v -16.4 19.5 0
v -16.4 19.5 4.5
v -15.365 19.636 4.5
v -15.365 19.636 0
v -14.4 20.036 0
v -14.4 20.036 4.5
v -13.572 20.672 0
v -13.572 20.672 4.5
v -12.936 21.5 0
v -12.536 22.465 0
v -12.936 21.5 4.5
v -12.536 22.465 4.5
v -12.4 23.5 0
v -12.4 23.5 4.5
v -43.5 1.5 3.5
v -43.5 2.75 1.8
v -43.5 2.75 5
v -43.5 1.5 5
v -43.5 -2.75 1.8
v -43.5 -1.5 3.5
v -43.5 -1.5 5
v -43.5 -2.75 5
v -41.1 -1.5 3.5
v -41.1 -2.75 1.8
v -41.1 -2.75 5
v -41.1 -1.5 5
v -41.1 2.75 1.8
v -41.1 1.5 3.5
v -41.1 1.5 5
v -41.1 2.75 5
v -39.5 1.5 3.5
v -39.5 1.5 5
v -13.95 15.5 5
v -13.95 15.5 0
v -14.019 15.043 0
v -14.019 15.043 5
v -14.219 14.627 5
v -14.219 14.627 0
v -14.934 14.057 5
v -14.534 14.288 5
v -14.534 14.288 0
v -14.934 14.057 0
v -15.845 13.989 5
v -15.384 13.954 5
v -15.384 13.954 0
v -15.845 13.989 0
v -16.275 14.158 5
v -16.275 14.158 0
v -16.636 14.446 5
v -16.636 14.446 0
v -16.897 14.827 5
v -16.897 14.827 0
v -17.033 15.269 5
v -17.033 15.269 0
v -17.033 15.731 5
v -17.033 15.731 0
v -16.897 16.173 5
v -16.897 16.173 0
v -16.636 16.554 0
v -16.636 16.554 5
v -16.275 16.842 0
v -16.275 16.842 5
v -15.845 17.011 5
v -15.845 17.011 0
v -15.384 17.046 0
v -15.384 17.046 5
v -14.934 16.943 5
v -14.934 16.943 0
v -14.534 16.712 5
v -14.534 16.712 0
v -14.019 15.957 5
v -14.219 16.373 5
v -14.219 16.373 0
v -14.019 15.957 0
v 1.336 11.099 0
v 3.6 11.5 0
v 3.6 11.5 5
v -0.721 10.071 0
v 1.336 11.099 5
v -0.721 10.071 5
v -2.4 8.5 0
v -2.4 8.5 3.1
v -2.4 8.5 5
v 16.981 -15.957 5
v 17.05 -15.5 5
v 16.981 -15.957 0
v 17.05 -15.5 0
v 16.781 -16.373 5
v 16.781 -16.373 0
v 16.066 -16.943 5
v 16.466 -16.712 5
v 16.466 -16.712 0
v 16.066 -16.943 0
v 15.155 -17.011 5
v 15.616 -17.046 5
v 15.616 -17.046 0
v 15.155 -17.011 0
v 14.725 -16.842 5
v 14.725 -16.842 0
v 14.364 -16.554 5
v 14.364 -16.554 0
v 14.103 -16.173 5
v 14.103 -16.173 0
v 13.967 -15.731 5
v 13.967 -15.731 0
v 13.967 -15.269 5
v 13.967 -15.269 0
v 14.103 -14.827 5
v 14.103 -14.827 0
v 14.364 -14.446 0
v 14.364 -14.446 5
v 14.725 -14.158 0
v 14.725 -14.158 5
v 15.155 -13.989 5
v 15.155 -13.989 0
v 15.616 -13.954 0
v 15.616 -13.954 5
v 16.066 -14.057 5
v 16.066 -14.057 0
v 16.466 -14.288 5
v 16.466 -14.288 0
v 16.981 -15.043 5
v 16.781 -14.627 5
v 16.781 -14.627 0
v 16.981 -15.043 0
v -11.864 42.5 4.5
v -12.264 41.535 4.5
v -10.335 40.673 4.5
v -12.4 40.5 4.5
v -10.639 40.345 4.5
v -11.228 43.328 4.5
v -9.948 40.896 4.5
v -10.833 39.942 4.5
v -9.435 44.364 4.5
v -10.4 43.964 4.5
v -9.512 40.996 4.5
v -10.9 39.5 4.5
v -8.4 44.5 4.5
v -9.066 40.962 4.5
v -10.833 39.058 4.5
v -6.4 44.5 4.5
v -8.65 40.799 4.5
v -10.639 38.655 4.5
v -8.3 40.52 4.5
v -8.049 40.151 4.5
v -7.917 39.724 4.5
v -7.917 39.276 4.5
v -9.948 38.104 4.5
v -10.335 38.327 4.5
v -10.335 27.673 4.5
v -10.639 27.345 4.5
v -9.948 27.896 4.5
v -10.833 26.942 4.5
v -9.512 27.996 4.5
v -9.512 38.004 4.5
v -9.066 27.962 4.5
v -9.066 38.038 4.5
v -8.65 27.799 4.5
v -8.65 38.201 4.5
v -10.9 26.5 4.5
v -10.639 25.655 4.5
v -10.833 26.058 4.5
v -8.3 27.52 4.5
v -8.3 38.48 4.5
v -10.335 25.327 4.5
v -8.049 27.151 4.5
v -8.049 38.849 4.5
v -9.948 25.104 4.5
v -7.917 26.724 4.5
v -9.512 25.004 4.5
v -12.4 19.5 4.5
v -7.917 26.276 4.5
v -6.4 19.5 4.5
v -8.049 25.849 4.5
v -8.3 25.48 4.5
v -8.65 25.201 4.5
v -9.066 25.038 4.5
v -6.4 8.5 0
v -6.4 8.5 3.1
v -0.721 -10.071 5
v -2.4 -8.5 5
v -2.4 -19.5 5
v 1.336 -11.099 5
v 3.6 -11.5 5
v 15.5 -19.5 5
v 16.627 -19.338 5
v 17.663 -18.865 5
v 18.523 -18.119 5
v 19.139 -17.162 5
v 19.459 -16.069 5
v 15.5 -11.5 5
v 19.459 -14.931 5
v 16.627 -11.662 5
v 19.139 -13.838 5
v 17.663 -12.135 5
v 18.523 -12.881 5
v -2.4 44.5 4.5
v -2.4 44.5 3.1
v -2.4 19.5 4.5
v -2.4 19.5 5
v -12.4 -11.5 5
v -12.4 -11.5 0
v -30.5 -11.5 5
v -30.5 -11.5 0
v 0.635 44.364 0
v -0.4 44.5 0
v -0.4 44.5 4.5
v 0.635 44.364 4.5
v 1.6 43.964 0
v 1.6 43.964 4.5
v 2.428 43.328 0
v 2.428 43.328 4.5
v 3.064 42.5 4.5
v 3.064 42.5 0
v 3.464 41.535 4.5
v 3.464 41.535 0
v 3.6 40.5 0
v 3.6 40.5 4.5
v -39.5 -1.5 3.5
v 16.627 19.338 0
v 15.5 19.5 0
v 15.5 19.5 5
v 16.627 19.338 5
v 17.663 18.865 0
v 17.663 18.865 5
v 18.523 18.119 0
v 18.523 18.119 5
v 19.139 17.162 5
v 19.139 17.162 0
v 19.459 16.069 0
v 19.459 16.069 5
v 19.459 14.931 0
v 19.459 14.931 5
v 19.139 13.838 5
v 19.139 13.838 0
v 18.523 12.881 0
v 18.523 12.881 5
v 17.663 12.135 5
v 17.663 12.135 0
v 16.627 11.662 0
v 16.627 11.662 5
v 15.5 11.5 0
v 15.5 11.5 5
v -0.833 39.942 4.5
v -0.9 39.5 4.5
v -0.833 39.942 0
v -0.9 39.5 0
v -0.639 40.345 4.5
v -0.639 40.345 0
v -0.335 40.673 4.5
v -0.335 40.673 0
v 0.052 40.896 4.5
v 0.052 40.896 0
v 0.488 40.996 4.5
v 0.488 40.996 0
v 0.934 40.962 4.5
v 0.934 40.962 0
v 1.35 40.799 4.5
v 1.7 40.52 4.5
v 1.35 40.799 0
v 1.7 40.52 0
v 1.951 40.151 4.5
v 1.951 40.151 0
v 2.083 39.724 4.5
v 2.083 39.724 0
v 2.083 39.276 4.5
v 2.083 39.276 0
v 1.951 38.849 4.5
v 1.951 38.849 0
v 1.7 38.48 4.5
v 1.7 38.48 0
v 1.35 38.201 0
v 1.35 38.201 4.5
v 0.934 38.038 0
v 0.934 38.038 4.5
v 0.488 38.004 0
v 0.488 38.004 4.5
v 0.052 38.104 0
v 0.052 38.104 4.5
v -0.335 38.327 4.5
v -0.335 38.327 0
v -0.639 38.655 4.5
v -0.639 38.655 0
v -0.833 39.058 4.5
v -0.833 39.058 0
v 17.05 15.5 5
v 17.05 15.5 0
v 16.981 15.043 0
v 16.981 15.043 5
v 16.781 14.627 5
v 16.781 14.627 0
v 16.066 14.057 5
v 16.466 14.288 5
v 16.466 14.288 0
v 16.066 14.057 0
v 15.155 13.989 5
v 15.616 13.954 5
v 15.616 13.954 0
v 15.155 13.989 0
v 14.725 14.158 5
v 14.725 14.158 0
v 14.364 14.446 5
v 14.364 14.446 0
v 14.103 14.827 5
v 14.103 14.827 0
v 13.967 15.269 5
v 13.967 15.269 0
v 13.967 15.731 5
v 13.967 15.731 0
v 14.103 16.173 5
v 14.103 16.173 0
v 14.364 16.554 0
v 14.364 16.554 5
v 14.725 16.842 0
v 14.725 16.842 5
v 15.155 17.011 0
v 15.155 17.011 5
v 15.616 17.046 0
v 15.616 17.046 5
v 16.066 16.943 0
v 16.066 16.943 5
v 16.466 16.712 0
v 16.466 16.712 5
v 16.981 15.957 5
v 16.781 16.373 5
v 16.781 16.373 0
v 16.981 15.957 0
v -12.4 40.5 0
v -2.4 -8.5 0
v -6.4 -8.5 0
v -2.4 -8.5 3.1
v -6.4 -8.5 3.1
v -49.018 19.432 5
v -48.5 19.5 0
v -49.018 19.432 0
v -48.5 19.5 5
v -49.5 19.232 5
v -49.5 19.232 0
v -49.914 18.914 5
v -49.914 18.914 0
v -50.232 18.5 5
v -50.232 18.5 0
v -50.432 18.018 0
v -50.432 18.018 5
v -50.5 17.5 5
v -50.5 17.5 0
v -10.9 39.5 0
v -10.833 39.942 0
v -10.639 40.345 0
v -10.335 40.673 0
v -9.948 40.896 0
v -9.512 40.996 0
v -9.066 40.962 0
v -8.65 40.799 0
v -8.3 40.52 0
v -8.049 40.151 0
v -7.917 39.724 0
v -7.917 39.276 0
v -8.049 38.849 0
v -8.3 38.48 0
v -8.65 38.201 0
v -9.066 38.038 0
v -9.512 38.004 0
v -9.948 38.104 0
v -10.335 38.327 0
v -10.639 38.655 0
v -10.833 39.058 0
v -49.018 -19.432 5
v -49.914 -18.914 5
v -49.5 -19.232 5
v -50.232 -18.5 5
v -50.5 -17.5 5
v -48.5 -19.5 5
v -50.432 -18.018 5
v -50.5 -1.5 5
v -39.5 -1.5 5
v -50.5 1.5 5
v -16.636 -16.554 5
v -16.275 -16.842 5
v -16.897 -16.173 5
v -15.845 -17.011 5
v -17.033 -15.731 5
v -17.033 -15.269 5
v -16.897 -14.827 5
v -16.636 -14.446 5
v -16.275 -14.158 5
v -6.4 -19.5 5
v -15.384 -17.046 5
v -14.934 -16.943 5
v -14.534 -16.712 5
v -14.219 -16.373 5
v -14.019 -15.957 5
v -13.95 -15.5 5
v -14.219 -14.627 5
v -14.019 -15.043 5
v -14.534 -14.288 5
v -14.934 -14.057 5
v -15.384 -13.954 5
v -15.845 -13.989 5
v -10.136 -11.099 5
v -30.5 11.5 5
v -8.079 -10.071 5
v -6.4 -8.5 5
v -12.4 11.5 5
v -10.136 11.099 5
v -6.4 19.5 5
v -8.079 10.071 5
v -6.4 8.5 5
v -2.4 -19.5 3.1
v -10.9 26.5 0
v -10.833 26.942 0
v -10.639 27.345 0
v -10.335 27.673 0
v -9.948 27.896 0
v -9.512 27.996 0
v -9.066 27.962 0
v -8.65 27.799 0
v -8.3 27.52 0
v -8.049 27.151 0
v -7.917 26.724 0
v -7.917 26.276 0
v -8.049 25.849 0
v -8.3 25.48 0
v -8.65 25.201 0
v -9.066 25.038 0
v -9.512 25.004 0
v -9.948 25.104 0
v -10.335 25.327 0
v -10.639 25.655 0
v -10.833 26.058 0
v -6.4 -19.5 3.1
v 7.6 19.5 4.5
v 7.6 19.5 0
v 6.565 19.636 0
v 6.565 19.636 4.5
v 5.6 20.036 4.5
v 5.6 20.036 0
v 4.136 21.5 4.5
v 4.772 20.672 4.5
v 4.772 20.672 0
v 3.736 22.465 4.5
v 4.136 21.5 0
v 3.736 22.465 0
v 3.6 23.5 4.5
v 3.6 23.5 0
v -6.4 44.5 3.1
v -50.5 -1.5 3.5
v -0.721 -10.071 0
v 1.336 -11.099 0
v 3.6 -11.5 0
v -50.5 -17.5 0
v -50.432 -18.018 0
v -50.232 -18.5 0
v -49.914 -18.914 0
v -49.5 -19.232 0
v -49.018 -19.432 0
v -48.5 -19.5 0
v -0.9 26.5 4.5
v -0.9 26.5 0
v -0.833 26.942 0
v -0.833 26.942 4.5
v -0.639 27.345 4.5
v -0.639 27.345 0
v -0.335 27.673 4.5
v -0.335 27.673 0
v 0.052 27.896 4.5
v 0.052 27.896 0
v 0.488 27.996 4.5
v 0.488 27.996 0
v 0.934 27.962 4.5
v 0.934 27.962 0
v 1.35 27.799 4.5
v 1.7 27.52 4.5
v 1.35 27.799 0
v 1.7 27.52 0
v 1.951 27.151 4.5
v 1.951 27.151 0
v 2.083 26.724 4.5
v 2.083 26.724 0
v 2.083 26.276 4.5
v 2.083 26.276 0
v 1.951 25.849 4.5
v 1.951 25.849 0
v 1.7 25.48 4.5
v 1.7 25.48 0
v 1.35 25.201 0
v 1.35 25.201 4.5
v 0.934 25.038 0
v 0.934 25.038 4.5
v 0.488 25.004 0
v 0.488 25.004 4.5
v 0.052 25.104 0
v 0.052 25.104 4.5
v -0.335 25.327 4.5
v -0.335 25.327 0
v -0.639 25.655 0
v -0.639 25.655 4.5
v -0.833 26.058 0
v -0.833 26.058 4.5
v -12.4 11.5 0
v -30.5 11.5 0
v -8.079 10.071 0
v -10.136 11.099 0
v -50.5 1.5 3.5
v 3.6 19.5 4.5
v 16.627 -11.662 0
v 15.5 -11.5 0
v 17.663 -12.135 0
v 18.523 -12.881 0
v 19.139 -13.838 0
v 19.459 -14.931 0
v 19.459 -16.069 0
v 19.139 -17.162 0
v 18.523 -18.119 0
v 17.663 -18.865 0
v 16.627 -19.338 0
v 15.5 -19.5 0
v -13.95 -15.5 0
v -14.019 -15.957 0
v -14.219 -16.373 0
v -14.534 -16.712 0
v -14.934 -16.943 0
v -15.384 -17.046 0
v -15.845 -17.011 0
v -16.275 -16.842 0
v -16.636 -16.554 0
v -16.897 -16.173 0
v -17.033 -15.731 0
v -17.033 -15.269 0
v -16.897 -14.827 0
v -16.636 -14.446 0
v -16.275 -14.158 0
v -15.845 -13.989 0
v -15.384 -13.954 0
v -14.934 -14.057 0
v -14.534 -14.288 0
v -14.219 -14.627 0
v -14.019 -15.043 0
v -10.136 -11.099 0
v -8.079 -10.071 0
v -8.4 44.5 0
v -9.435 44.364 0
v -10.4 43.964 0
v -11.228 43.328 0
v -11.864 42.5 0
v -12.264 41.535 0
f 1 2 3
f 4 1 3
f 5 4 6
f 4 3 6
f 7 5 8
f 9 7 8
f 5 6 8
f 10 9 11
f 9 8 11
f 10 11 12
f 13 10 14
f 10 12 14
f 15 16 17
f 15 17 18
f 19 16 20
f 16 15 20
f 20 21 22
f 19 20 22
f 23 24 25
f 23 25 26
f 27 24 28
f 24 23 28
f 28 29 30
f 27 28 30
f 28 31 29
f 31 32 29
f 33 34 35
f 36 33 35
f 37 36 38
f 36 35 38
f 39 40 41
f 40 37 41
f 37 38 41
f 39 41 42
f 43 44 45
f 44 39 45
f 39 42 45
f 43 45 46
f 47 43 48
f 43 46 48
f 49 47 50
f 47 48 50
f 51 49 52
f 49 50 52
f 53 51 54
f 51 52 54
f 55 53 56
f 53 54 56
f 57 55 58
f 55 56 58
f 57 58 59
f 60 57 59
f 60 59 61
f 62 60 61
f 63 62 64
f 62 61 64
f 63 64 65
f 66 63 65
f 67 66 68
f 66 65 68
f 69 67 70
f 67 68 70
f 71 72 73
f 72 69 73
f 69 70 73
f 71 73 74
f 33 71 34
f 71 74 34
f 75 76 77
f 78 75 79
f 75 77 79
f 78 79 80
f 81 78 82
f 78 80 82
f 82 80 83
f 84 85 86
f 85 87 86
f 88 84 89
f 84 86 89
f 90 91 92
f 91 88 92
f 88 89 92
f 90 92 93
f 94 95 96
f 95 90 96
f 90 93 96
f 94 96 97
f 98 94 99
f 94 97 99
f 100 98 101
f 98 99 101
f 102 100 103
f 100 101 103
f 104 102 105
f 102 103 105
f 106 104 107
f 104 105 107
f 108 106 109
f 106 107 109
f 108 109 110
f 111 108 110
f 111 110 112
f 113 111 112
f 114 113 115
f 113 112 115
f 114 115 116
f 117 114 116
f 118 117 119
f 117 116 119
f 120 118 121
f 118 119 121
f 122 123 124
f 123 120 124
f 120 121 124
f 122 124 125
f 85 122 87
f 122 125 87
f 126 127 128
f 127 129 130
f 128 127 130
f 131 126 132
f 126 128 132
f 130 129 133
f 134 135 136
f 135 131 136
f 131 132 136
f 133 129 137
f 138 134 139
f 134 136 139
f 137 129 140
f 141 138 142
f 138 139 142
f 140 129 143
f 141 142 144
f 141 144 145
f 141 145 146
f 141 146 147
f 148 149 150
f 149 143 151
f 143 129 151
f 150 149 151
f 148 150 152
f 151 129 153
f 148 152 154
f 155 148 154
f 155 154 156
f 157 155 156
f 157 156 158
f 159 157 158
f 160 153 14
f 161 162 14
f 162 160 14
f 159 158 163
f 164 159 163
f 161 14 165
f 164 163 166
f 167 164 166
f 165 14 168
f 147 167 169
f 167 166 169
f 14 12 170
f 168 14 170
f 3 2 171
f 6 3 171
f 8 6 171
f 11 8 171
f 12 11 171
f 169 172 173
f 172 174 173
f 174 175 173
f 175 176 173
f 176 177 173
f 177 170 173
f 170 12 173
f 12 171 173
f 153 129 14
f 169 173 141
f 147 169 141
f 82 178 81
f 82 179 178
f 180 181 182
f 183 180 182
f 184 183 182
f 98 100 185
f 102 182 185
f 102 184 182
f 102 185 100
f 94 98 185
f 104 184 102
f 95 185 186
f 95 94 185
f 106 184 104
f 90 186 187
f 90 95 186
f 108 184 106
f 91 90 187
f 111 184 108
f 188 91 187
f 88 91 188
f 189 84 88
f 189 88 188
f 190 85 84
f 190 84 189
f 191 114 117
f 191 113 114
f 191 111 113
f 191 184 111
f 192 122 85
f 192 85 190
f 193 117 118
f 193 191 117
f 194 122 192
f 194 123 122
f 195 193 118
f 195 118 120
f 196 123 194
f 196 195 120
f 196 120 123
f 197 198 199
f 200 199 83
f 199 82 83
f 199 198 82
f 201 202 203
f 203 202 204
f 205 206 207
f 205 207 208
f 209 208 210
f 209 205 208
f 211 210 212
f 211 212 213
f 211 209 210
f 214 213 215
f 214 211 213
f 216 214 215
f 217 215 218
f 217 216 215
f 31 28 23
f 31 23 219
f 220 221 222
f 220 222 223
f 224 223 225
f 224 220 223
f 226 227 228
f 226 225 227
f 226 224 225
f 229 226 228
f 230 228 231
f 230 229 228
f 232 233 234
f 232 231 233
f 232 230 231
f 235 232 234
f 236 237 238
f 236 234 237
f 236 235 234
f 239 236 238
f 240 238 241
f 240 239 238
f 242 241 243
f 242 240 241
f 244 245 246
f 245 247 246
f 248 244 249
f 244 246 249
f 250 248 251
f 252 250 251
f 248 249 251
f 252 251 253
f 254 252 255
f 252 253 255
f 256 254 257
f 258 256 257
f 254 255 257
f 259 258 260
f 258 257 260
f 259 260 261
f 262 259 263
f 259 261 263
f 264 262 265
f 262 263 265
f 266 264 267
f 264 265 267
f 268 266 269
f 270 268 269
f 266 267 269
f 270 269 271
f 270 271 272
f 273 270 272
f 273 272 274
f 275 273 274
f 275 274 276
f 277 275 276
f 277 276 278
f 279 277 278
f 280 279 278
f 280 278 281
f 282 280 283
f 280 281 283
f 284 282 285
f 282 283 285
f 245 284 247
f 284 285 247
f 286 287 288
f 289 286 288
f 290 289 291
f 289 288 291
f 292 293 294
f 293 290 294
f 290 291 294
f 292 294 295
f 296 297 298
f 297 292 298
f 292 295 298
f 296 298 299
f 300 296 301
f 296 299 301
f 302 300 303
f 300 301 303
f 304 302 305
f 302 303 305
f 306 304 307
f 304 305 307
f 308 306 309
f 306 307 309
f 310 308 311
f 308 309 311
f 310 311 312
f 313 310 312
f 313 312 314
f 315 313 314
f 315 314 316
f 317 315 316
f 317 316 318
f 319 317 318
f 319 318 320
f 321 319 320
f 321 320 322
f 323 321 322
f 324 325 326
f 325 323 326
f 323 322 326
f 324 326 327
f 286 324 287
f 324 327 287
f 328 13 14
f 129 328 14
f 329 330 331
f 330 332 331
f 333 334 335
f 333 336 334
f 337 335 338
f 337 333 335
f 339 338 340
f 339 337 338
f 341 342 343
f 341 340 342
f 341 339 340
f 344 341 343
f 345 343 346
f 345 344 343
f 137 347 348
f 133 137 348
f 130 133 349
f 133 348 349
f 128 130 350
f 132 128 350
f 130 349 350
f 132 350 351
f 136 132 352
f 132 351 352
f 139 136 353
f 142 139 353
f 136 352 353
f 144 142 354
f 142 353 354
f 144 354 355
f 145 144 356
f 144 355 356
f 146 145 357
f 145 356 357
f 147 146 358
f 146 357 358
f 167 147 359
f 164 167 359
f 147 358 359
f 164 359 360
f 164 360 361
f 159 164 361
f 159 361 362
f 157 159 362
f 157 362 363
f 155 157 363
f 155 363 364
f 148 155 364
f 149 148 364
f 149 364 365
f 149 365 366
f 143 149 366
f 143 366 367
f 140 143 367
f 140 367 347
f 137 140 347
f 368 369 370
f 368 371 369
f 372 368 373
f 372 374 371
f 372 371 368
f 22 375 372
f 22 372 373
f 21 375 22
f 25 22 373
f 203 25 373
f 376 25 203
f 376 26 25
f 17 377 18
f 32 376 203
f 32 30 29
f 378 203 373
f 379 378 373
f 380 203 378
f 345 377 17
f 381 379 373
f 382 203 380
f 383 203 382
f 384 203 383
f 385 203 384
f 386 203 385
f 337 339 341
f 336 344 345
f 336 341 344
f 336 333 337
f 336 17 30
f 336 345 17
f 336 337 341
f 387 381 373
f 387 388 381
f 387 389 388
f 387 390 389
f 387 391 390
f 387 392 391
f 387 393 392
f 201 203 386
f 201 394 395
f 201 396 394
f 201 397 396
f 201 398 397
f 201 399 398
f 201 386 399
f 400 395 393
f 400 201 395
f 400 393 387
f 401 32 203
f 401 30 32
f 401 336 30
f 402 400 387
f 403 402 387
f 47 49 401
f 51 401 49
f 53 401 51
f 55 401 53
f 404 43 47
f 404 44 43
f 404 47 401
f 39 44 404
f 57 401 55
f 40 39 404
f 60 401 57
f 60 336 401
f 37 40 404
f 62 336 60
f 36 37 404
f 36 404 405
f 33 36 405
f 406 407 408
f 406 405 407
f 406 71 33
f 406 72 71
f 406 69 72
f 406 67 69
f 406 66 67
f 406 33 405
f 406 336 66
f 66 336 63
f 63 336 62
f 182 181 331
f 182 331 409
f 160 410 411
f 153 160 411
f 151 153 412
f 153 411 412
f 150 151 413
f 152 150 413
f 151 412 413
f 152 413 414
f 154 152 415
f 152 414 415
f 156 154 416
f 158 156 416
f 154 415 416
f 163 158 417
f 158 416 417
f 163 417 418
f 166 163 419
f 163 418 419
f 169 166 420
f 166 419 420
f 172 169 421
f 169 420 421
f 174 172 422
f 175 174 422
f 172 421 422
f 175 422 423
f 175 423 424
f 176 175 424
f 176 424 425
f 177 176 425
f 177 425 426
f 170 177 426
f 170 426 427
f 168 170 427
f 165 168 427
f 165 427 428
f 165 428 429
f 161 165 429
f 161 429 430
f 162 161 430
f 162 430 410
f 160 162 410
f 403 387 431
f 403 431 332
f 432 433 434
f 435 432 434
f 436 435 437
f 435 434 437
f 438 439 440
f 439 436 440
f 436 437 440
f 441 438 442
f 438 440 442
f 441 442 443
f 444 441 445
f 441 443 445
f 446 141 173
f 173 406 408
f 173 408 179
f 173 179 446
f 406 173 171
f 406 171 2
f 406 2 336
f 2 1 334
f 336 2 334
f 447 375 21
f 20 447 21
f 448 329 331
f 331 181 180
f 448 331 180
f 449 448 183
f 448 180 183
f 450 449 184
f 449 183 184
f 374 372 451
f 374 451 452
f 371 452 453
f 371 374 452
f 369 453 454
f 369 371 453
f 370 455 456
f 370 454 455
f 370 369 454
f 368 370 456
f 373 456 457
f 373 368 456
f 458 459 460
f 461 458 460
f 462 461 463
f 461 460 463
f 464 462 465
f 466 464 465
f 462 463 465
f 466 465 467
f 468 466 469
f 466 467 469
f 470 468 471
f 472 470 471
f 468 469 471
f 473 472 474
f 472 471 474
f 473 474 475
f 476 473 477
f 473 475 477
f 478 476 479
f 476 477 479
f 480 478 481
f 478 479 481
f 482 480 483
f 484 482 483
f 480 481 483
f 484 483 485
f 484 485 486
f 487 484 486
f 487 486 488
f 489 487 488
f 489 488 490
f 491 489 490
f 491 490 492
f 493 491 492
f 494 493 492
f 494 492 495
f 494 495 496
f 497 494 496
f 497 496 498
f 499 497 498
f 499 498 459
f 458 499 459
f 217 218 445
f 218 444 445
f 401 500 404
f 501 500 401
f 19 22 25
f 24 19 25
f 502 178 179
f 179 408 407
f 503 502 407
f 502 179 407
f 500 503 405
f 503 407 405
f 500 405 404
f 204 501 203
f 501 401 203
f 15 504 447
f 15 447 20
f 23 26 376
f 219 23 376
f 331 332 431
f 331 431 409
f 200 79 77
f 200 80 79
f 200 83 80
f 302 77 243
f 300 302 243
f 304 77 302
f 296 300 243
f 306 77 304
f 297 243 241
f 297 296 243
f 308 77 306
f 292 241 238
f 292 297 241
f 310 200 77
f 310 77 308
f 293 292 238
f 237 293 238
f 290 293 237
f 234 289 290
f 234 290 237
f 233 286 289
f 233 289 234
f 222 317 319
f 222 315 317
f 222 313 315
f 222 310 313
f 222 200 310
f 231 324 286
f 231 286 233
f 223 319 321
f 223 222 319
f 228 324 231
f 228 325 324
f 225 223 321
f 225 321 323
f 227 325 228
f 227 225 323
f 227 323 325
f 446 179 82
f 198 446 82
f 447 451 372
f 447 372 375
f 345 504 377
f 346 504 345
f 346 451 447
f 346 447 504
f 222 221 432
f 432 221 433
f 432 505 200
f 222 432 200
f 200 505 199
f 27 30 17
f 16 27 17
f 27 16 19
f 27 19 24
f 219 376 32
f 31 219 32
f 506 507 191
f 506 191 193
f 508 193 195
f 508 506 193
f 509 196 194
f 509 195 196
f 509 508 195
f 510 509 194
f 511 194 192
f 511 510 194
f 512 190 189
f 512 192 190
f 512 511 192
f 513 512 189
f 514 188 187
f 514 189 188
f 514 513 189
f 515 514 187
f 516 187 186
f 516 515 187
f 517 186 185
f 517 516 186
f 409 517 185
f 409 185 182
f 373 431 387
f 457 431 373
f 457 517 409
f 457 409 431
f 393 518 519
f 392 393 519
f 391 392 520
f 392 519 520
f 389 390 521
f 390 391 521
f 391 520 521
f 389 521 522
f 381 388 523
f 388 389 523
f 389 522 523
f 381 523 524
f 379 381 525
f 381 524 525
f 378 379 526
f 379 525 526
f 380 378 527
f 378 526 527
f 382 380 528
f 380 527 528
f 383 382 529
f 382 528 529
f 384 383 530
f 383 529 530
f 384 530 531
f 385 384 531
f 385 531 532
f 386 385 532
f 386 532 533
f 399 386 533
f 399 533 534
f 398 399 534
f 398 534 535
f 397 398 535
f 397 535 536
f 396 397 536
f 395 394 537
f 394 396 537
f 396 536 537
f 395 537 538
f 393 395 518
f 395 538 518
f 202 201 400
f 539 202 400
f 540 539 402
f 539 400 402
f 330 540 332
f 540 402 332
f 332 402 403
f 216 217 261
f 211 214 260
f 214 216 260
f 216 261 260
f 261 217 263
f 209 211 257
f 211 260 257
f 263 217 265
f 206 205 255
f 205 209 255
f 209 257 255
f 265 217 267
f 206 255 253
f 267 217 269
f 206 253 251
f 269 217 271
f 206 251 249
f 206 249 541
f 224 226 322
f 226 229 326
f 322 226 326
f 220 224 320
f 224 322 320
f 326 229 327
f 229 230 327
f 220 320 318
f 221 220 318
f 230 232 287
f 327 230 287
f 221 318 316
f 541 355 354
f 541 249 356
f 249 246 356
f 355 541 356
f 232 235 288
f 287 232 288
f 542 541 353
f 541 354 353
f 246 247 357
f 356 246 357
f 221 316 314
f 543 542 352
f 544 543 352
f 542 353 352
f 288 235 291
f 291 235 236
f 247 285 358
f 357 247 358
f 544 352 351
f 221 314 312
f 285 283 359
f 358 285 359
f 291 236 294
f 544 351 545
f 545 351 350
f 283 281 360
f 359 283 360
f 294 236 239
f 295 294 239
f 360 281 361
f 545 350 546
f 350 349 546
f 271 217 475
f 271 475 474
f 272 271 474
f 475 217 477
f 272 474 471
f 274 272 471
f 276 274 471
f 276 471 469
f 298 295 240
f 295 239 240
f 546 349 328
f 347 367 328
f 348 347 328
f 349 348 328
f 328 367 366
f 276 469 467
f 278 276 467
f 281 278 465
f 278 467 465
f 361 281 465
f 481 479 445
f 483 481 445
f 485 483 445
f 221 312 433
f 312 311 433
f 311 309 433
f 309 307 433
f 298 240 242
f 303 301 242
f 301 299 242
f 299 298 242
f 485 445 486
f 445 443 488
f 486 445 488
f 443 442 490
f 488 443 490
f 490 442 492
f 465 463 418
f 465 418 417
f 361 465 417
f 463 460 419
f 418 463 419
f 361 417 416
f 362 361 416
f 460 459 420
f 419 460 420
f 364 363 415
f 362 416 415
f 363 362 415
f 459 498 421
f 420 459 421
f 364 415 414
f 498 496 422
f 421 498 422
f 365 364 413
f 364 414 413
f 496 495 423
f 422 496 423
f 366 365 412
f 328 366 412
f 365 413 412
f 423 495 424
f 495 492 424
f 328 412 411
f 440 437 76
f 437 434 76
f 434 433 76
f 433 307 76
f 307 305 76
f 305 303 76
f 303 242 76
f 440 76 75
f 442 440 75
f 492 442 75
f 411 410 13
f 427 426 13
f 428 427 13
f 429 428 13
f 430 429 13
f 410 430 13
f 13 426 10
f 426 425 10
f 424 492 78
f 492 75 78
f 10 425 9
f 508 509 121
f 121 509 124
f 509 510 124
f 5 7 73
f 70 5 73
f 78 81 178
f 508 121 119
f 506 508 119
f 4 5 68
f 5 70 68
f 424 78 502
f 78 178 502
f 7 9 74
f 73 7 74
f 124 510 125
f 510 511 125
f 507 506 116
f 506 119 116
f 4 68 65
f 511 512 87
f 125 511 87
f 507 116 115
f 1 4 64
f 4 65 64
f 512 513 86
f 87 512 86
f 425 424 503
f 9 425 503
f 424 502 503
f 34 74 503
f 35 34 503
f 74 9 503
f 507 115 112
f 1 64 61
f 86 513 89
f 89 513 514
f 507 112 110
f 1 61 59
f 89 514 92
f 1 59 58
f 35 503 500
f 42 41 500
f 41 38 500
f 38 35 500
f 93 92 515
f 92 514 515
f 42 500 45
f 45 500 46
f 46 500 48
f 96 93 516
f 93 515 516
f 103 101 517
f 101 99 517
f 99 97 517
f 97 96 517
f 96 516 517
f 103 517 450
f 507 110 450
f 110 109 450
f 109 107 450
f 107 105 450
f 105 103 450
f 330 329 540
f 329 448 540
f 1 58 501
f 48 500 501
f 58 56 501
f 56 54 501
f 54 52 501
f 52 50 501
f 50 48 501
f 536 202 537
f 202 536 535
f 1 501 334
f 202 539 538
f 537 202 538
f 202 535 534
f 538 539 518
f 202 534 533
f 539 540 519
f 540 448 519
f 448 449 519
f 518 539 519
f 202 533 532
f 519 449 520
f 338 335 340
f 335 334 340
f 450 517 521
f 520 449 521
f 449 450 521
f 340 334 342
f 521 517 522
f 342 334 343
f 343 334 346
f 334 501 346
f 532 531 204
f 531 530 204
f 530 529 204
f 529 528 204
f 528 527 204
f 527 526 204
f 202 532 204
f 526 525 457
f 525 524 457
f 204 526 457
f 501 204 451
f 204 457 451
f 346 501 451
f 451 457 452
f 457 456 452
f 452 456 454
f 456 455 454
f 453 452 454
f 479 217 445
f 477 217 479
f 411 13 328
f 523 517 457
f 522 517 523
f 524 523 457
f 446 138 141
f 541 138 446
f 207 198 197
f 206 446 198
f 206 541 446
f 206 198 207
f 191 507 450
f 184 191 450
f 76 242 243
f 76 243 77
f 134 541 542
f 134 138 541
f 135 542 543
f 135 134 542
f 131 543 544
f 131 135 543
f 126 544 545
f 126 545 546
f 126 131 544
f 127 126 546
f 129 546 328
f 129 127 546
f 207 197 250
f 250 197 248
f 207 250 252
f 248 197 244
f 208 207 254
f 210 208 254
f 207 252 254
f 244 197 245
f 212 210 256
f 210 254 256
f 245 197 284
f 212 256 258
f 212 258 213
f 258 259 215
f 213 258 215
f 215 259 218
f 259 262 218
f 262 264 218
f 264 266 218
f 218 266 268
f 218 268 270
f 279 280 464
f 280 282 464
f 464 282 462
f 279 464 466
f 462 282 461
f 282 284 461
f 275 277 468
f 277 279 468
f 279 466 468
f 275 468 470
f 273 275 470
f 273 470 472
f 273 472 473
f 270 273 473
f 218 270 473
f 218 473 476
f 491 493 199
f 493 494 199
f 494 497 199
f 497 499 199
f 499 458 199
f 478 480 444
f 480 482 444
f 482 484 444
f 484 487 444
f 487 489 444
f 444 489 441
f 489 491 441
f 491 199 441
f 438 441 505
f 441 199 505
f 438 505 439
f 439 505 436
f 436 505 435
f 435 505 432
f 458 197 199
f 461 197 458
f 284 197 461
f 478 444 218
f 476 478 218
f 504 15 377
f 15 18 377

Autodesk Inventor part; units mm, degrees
ref_plane "YZ Plane" through (0, 0, 0) normal (1, 0, 0) x (0, 1, 0)
ref_plane "XZ Plane" through (0, 0, 0) normal (0, 1, 0) x (-1, 0, 0)
sketch "Skizze1" plane through (0, 0, 0) normal (0, 0, 1) x (1, 0, 0)
  line L0 (0, -27.3) -> (0, 27.3) projected
  line L1 (-71.7, 0) -> (34.7, 0) projected
  circle A0 centre (-15.5, 15.5) radius 1.55
  circle A1 centre (15.5, 15.5) radius 1.55
  circle A2 centre (-15.5, -15.5) radius 1.55
  circle A3 centre (15.5, -15.5) radius 1.55
  circle A4 centre (-16.5, 0) radius 11
  circle A5 centre (0, 0) radius 5.5
  circle A6 centre (-16.5, 0) radius 4
  arc A7 (-16.5, -7.5) -> (-16.5, 7.5) centre (-16.5, 0) ccw
  line L2 (-16.5, 7.5) -> (-36.5, 7.5)
  line L3 (-36.5, 7.5) -> (-56.5, 7.5)
  line L4 (-56.5, 7.5) -> (-56.5, -7.5)
  line L5 (-56.5, -7.5) -> (-16.5, -7.5)
  circle A8 centre (15.5, 15.5) radius 4
  circle A9 centre (-15.5, 15.5) radius 4
  line L6 (15.5, 11.5) -> (-15.5, 11.5)
  line L7 (15.5, 19.5) -> (-15.5, 19.5)
  line L8 (-15.5, 19.5) -> (-50.5, 19.5)
  line L9 (-15.5, 11.5) -> (-30.5, 11.5)
  line L10 (-50.5, 19.5) -> (-50.5, 0)
  line L11 (-30.5, 11.5) -> (-30.5, 0)
  line L12 (-15.5, -19.5) -> (-50.5, -19.5)
  line L13 (-15.5, -11.5) -> (-30.5, -11.5)
  line L14 (-50.5, -19.5) -> (-50.5, 0)
  line L15 (-30.5, -11.5) -> (-30.5, 0)
  line L16 (15.5, -11.5) -> (-15.5, -11.5)
  line L17 (15.5, -19.5) -> (-15.5, -19.5)
  line L18 (-15.5, -11.5) -> (15.5, -11.5)
  line L19 (15.5, -19.5) -> (-15.5, -19.5)
  line L20 (-30.5, -11.5) -> (15.5, -11.5)
  line L21 (15.5, -19.5) -> (-50.5, -19.5)
  arc A10 (15.5, -19.5) -> (15.5, -11.5) centre (15.5, -15.5) ccw
  point P0 (-50.5, 7.5)
  point P1 (-30.5, 7.5)
  dimension "d0" = 3.1
  dimension "d1" = 15.5
  dimension "d2" = 15.5
  dimension "d3" = 22
  dimension "d4" = 16.5
  dimension "d5" = 11
  dimension "d6" = 8
  dimension "d7" = 15
  dimension "d10" = 15
  dimension "d11" = 40
  dimension "d17" = 8
  dimension "d19" = 8
  dimension "d22" = 35
  dimension "d23" = 15
ref_plane "Arbeitsebene1" through (0, 0, 5) normal (0, 0, 1) x (1, 0, 0)
extrude "Extrusion5" add sketch "Skizze1" along normal blind 5 contours L17 L12 L14 L5 L15 L13 L16 L0 | L0 L16 A10 L17 | L14 L1 L15 L5 | L10 L3 L2 L11 L1 | L6 A9 L7 L0 | L0 L7 A8 L6 | L2 L3 L10 L8 A9 L9 L11 | A8 | A9
sketch "Skizze4" plane through (0, 0, 5) normal (0, 0, 1) x (1, 0, 0)
  line L0 (-30.5, 11.5) -> (15.5, 11.5) projected
  arc A0 (15.5, 11.5) -> (15.5, 19.5) centre (15.5, 15.5) ccw projected
  line L1 (15.5, 19.5) -> (-50.5, 19.5) projected
  line L2 (-50.5, 19.5) -> (-50.5, -19.5) projected
  line L3 (-50.5, -19.5) -> (15.5, -19.5) projected
  arc A1 (15.5, -19.5) -> (15.5, -11.5) centre (15.5, -15.5) ccw projected
  line L4 (15.5, -11.5) -> (-30.5, -11.5) projected
  line L5 (-30.5, -11.5) -> (-30.5, 11.5) projected
  circle A2 centre (15.5, 15.5) radius 1.55 projected
  circle A3 centre (15.5, -15.5) radius 1.55 projected
  circle A4 centre (-15.5, -15.5) radius 1.55 projected
  circle A5 centre (-15.5, 15.5) radius 1.55 projected
  line L6 (-64.5, 0) -> (33.5, 0) projected
  line L7 (-30.5, -11.5) -> (-30.5, 11.5) projected
  line L8 (-50.5, -1.5) -> (-30.5, -1.5)
  line L9 (-30.5, -1.5) -> (-30.5, 1.5)
  line L10 (-30.5, 1.5) -> (-50.5, 1.5)
  line L11 (-50.5, 1.5) -> (-50.5, -1.5)
  point P0 (0, 0)
  dimension "d34" = 3
extrude "Extrusion8" cut sketch "Skizze4" against normal blind 1.5 contours L5 L6 L2 L10 | L5 L8 L2 L6
sketch "Skizze5" plane through (0, 0, 5) normal (0, 0, 1) x (1, 0, 0)
  line L0 (-50.5, 1.5) -> (-30.5, 1.5) projected
  line L1 (-30.5, 1.5) -> (-30.5, 11.5) projected
  line L2 (-30.5, 11.5) -> (15.5, 11.5) projected
  arc A0 (15.5, 11.5) -> (15.5, 19.5) centre (15.5, 15.5) ccw projected
  line L3 (15.5, 19.5) -> (-50.5, 19.5) projected
  line L4 (-50.5, 19.5) -> (-50.5, 1.5) projected
  circle A1 centre (15.5, 15.5) radius 1.55 projected
  circle A2 centre (-15.5, 15.5) radius 1.55 projected
  circle A3 centre (-15.5, -15.5) radius 1.55 projected
  circle A4 centre (15.5, -15.5) radius 1.55 projected
  line L5 (-30.5, -1.5) -> (-50.5, -1.5) projected
  line L6 (-50.5, -1.5) -> (-50.5, -19.5) projected
  line L7 (-50.5, -19.5) -> (15.5, -19.5) projected
  arc A5 (15.5, -19.5) -> (15.5, -11.5) centre (15.5, -15.5) ccw projected
  line L8 (15.5, -11.5) -> (-30.5, -11.5) projected
  line L9 (-30.5, -11.5) -> (-30.5, -1.5) projected
  line L10 (-30.5, -1.5) -> (-50.5, -1.5) projected
  line L11 (-30.5, 1.5) -> (-30.5, -1.5) projected
  line L12 (-50.5, 1.5) -> (-30.5, 1.5) projected
  line L13 (-50.5, -1.5) -> (-50.5, 1.5) projected
  line L14 (-64.5, 0) -> (33.5, 0) projected
  line L15 (-43.5, -2.75) -> (-41.1, -2.75)
  line L16 (-41.1, -2.75) -> (-41.1, 2.75)
  line L17 (-41.1, 2.75) -> (-43.5, 2.75)
  line L18 (-43.5, 2.75) -> (-43.5, -2.75)
  point P0 (0, 0)
  dimension "d37" = 2.4
  dimension "d38" = 5.5
  dimension "d39" = 7
extrude "Extrusion9" cut sketch "Skizze5" against normal blind 3.2 contours L18 L17 L16 L0 | L0 L16 L14 L18 | L14 L16 L5 L18 | L5 L16 L15 L18
sketch "Skizze6" plane through (0, 0, 5) normal (0, 0, 1) x (1, 0, 0)
  line L0 (15.5, 19.5) -> (-50.5, 19.5) projected
  line L1 (-50.5, -19.5) -> (15.5, -19.5) projected
  line L2 (-6.4, 19.5) -> (-2.4, 19.5)
  line L3 (-2.4, 19.5) -> (-2.4, -19.5)
  line L4 (-2.4, -19.5) -> (-6.4, -19.5)
  line L5 (-6.4, -19.5) -> (-6.4, 19.5)
  line L6 (-41.1, -1.5) -> (-41.1, -2.75) projected
  line L7 (-41.1, -2.75) -> (-43.5, -2.75) projected
  line L8 (-43.5, -2.75) -> (-43.5, -1.5) projected
  line L9 (-43.5, -1.5) -> (-50.5, -1.5) projected
  line L10 (-50.5, -1.5) -> (-50.5, -19.5) projected
  line L11 (-50.5, -19.5) -> (15.5, -19.5) projected
  arc A0 (15.5, -19.5) -> (15.5, -11.5) centre (15.5, -15.5) ccw projected
  line L12 (15.5, -11.5) -> (-30.5, -11.5) projected
  line L13 (-30.5, -11.5) -> (-30.5, -1.5) projected
  line L14 (-30.5, -1.5) -> (-41.1, -1.5) projected
  circle A1 centre (15.5, -15.5) radius 1.55 projected
  circle A2 centre (-15.5, -15.5) radius 1.55 projected
  line L15 (0, -27.3) -> (0, 27.3) projected
  line L16 (-64.5, 0) -> (33.5, 0) projected
  circle A3 centre (0, 0) radius 3.5191
  dimension "d42" = 4
  dimension "d43" = 2.4
extrude "Extrusion10" cut sketch "Skizze6" against normal blind 1.9 contours L3 A3 L16 L5 L0 | L3 L16 A3 | L16 A3 L3 L12 L5 | L3 A3 L16 | L12 L3 L1 L5
fillet "Rundung1" radius 2 1 edges at (-50.5, -19.5, 2.5)
fillet "Rundung2" radius 2 1 edges at (-50.5, 19.5, 2.5)
sketch "Skizze11" plane through (0, 0, 5) normal (0, 0, 1) x (1, 0, 0)
  line L0 (-2.4, 11.5) -> (-6.4, 11.5) projected
  line L1 (-2.4, 19.5) -> (-2.4, 11.5) projected
  line L2 (-6.4, 19.5) -> (-2.4, 19.5) projected
  line L3 (-6.4, 11.5) -> (-6.4, 19.5) projected
  arc A0 (-48.5, 19.5) -> (-50.5, 17.5) centre (-48.5, 17.5) ccw projected
  line L4 (-50.5, 17.5) -> (-50.5, 1.5) projected
  line L5 (-50.5, 1.5) -> (-43.5, 1.5) projected
  line L6 (-43.5, 1.5) -> (-43.5, 2.75) projected
  line L7 (-43.5, 2.75) -> (-41.1, 2.75) projected
  line L8 (-41.1, 2.75) -> (-41.1, 1.5) projected
  line L9 (-41.1, 1.5) -> (-30.5, 1.5) projected
  line L10 (-30.5, 1.5) -> (-30.5, 11.5) projected
  line L11 (-30.5, 11.5) -> (-6.4, 11.5) projected
  line L12 (-6.4, 11.5) -> (-6.4, 19.5) projected
  line L13 (-6.4, 19.5) -> (-48.5, 19.5) projected
  circle A1 centre (-15.5, 15.5) radius 1.55 projected
  line L14 (-2.4, 19.5) -> (-2.4, 11.5) projected
  line L15 (-2.4, 11.5) -> (15.5, 11.5) projected
  arc A2 (15.5, 11.5) -> (15.5, 19.5) centre (15.5, 15.5) ccw projected
  line L16 (15.5, 19.5) -> (-2.4, 19.5) projected
  circle A3 centre (15.5, 15.5) radius 1.55 projected
  circle A4 centre (-15.5, -15.5) radius 1.55 projected
  arc A5 (-50.5, -17.5) -> (-48.5, -19.5) centre (-48.5, -17.5) ccw projected
  line L17 (-48.5, -19.5) -> (-6.4, -19.5) projected
  line L18 (-6.4, -19.5) -> (-6.4, -11.5) projected
  line L19 (-6.4, -11.5) -> (-30.5, -11.5) projected
  line L20 (-30.5, -11.5) -> (-30.5, -1.5) projected
  line L21 (-30.5, -1.5) -> (-41.1, -1.5) projected
  line L22 (-41.1, -1.5) -> (-41.1, -2.75) projected
  line L23 (-41.1, -2.75) -> (-43.5, -2.75) projected
  line L24 (-43.5, -2.75) -> (-43.5, -1.5) projected
  line L25 (-43.5, -1.5) -> (-50.5, -1.5) projected
  line L26 (-50.5, -1.5) -> (-50.5, -17.5) projected
  line L27 (-6.4, -11.5) -> (-2.4, -11.5) projected
  line L28 (-6.4, -19.5) -> (-6.4, -11.5) projected
  line L29 (-2.4, -19.5) -> (-6.4, -19.5) projected
  line L30 (-2.4, -11.5) -> (-2.4, -19.5) projected
  line L31 (-2.4, -11.5) -> (-2.4, -19.5) projected
  line L32 (-2.4, -19.5) -> (15.5, -19.5) projected
  arc A6 (15.5, -19.5) -> (15.5, -11.5) centre (15.5, -15.5) ccw projected
  line L33 (15.5, -11.5) -> (-2.4, -11.5) projected
  circle A7 centre (15.5, -15.5) radius 1.55 projected
  line L34 (-6.4, 11.5) -> (-6.4, 8.5)
  line L35 (-6.4, 8.5) -> (-2.4, 8.5)
  line L36 (-2.4, 8.5) -> (-2.4, 11.5)
  line L37 (-30.5, 11.5) -> (-6.4, 11.5) projected
  arc A8 (-6.4, 8.5) -> (-12.4, 11.5) centre (-12.6481, 3.5038) ccw
  line L38 (-30.5, 11.5) -> (15.5, 11.5) projected
  arc A9 (3.6, 11.5) -> (-2.4, 8.5) centre (3.8481, 3.5038) ccw
  line L39 (-64.9971, 0) -> (33.5828, 0) projected
  line L40 (-6.4, -11.5) -> (-6.4, -8.5)
  line L41 (-6.4, -8.5) -> (-2.4, -8.5)
  line L42 (-2.4, -8.5) -> (-2.4, -11.5)
  arc A10 (-12.4, -11.5) -> (-6.4, -8.5) centre (-12.6481, -3.5038) ccw
  arc A11 (-2.4, -8.5) -> (3.6, -11.5) centre (3.8481, -3.5038) ccw
  circle A12 centre (0, 0) radius 12 projected
  line L43 (-12.4, 11.5) -> (3.6, 11.5)
  line L44 (-12.4, -11.5) -> (3.6, -11.5)
  line L45 (15.5, -11.5) -> (-30.5, -11.5) projected
  point P0 (0, 0)
  dimension "d61" = 3
  dimension "d62" = 4
  dimension "d63" = 8
  dimension "d64" = 8
  dimension "d65" = 6
  dimension "d66" = 6
extrude "Extrusion13" add sketch "Skizze11" against normal blind 5 contours L36 L35 L34 A12 L0 | L15 A12 A9 L36 | A12 L34 L0 | L15 A9 A12 | L34 A12 A8 L11 | L34 A8 A12 | A12 L33 L42 A11 | A11 L33 A12 | A12 L40 L19 A10 | A10 L40 A12 | L42 L27 A12 L40 L41 | A12 L27 L40
sketch "Skizze12" plane through (0, 0, 5) normal (0, 0, 1) x (1, 0, 0)
  line L0 (-2.4, 11.5) -> (-6.4, 11.5) projected
  line L1 (-2.4, 19.5) -> (-2.4, 11.5) projected
  line L2 (-6.4, 19.5) -> (-2.4, 19.5) projected
  line L3 (-6.4, 11.5) -> (-6.4, 19.5) projected
  line L4 (-6.4, -11.5) -> (-2.4, -11.5) projected
  line L5 (-6.4, -19.5) -> (-6.4, -11.5) projected
  line L6 (-2.4, -19.5) -> (-6.4, -19.5) projected
  line L7 (-2.4, -11.5) -> (-2.4, -19.5) projected
  line L8 (-6.4, -11.5) -> (-2.4, -11.5)
  line L9 (-2.4, -11.5) -> (-2.4, 11.5)
  line L10 (-2.4, 11.5) -> (-6.4, 11.5)
  line L11 (-6.4, 11.5) -> (-6.4, -11.5)
  point P0 (0, 0)
extrude "Extrusion14" cut sketch "Skizze12" against normal blind 1.9 contours L9 L4 L11 L0
sketch "Skizze13" plane through (0, 0, 5) normal (0, 0, 1) x (1, 0, 0)
  line L0 (-41.1, 1.5) -> (-41.1, -1.5) projected
  line L1 (-30.5, -1.5) -> (-41.1, -1.5) projected
  line L2 (-30.5, 1.5) -> (-30.5, -1.5) projected
  line L3 (-41.1, 1.5) -> (-30.5, 1.5) projected
  line L4 (-6.4, -19.5) -> (-6.4, -8.5) projected
  arc A0 (-12.4, -11.5) -> (-6.4, -8.5) centre (-12.6481, -3.5038) ccw projected
  line L5 (-12.4, -11.5) -> (-30.5, -11.5) projected
  line L6 (-30.5, -11.5) -> (-30.5, -1.5) projected
  line L7 (-30.5, -1.5) -> (-41.1, -1.5) projected
  line L8 (-41.1, -1.5) -> (-41.1, -2.75) projected
  line L9 (-41.1, -2.75) -> (-43.5, -2.75) projected
  line L10 (-43.5, -2.75) -> (-43.5, -1.5) projected
  line L11 (-43.5, -1.5) -> (-50.5, -1.5) projected
  line L12 (-50.5, -1.5) -> (-50.5, -17.5) projected
  arc A1 (-50.5, -17.5) -> (-48.5, -19.5) centre (-48.5, -17.5) ccw projected
  line L13 (-48.5, -19.5) -> (-6.4, -19.5) projected
  circle A2 centre (-15.5, -15.5) radius 1.55 projected
  circle A3 centre (-15.5, 15.5) radius 1.55 projected
  line L14 (-6.4, 8.5) -> (-6.4, 19.5) projected
  line L15 (-6.4, 19.5) -> (-48.5, 19.5) projected
  arc A4 (-48.5, 19.5) -> (-50.5, 17.5) centre (-48.5, 17.5) ccw projected
  line L16 (-50.5, 17.5) -> (-50.5, 1.5) projected
  line L17 (-50.5, 1.5) -> (-43.5, 1.5) projected
  line L18 (-43.5, 1.5) -> (-43.5, 2.75) projected
  line L19 (-43.5, 2.75) -> (-41.1, 2.75) projected
  line L20 (-41.1, 2.75) -> (-41.1, 1.5) projected
  line L21 (-41.1, 1.5) -> (-30.5, 1.5) projected
  line L22 (-30.5, 1.5) -> (-30.5, 11.5) projected
  line L23 (-30.5, 11.5) -> (-12.4, 11.5) projected
  arc A5 (-6.4, 8.5) -> (-12.4, 11.5) centre (-12.6481, 3.5038) ccw projected
  line L24 (-41.1, 1.5) -> (-30.5, 1.5) projected
  line L25 (-30.5, -1.5) -> (-39.5, -1.5)
  line L26 (-39.5, -1.5) -> (-39.5, 1.5)
  line L27 (-39.5, 1.5) -> (-30.5, 1.5)
  line L28 (-30.5, 1.5) -> (-30.5, -1.5)
  point P0 (0, 0)
  dimension "d71" = 9
extrude "Extrusion15" add sketch "Skizze13" against normal blind 1.5 contours L3 L2 L1 L26
sketch "Skizze18" plane through (15.5, 19.5, 5) normal (0, 1, 0) x (1, 0, 0)
  line L0 (-23.9, -5) -> (-15.9, -5) projected
  line L1 (-17.9, -0.5) -> (-17.9, -1.9) projected
  line L2 (-17.9, -1.9) -> (-21.9, -1.9) projected
  line L3 (-21.9, -1.9) -> (-21.9, -0.5) projected
  line L4 (-17.9, 0) -> (-17.9, 0.5)
  line L5 (-17.9, 1.9) -> (-17.9, 0) projected
  line L6 (-17.9, 0.5) -> (-11.9, 0.5)
  line L7 (-11.9, 0) -> (-11.9, 5) projected
  line L8 (-11.9, 0.5) -> (-11.9, 5)
  line L9 (-11.9, 5) -> (-27.9, 5)
  line L10 (-64, 5) -> (0, 5) projected
  line L11 (-27.9, 5) -> (-27.9, 0.5)
  line L12 (-27.9, 0) -> (-27.9, 5) projected
  line L13 (-27.9, 0.5) -> (-21.9, 0.5)
  line L14 (-21.9, 0.5) -> (-21.9, 1.9)
  line L15 (-21.9, 1.9) -> (-17.9, 1.9)
  line L16 (-17.9, 1.9) -> (-17.9, 0.5)
  line L17 (-15.9, -0.5) -> (-15.9, -5) projected
  line L18 (-15.9, -0.5) -> (-17.9, -0.5) projected
  line L19 (-21.9, -0.5) -> (-23.9, -0.5) projected
  line L20 (-23.9, -5) -> (-23.9, -0.5) projected
  point P0 (-15.5, 5)
  dimension "d89" = 0.5
  dimension "d90" = 4.5
extrude "Extrusion18" add sketch "Skizze18" along normal blind 25 contours L15 L14 L13 L11 L9 L7 L6 L5
sketch "Skizze19" plane through (0, 0, 0) normal (0, 0, -1) x (-1, 0, 0)
  circle A0 centre (-0.6, 39.5) radius 1.5 projected
  circle A1 centre (9.4, 39.5) radius 1.5 projected
  circle A2 centre (9.4, 26.5) radius 1.5 projected
  circle A3 centre (-0.6, 26.5) radius 1.5 projected
  point P0 (0, 0)
extrude "Extrusion19" cut sketch "Skizze19" against normal blind 5
fillet "Rundung3" radius 4 4 edges at (3.6, 19.5, 2.25) (3.6, 44.5, 2.25) (-12.4, 44.5, 2.25) (-12.4, 19.5, 2.25)
properties part number "Drückbrücke_U_Gespiegelt" material "ABS-Kunststoff"
